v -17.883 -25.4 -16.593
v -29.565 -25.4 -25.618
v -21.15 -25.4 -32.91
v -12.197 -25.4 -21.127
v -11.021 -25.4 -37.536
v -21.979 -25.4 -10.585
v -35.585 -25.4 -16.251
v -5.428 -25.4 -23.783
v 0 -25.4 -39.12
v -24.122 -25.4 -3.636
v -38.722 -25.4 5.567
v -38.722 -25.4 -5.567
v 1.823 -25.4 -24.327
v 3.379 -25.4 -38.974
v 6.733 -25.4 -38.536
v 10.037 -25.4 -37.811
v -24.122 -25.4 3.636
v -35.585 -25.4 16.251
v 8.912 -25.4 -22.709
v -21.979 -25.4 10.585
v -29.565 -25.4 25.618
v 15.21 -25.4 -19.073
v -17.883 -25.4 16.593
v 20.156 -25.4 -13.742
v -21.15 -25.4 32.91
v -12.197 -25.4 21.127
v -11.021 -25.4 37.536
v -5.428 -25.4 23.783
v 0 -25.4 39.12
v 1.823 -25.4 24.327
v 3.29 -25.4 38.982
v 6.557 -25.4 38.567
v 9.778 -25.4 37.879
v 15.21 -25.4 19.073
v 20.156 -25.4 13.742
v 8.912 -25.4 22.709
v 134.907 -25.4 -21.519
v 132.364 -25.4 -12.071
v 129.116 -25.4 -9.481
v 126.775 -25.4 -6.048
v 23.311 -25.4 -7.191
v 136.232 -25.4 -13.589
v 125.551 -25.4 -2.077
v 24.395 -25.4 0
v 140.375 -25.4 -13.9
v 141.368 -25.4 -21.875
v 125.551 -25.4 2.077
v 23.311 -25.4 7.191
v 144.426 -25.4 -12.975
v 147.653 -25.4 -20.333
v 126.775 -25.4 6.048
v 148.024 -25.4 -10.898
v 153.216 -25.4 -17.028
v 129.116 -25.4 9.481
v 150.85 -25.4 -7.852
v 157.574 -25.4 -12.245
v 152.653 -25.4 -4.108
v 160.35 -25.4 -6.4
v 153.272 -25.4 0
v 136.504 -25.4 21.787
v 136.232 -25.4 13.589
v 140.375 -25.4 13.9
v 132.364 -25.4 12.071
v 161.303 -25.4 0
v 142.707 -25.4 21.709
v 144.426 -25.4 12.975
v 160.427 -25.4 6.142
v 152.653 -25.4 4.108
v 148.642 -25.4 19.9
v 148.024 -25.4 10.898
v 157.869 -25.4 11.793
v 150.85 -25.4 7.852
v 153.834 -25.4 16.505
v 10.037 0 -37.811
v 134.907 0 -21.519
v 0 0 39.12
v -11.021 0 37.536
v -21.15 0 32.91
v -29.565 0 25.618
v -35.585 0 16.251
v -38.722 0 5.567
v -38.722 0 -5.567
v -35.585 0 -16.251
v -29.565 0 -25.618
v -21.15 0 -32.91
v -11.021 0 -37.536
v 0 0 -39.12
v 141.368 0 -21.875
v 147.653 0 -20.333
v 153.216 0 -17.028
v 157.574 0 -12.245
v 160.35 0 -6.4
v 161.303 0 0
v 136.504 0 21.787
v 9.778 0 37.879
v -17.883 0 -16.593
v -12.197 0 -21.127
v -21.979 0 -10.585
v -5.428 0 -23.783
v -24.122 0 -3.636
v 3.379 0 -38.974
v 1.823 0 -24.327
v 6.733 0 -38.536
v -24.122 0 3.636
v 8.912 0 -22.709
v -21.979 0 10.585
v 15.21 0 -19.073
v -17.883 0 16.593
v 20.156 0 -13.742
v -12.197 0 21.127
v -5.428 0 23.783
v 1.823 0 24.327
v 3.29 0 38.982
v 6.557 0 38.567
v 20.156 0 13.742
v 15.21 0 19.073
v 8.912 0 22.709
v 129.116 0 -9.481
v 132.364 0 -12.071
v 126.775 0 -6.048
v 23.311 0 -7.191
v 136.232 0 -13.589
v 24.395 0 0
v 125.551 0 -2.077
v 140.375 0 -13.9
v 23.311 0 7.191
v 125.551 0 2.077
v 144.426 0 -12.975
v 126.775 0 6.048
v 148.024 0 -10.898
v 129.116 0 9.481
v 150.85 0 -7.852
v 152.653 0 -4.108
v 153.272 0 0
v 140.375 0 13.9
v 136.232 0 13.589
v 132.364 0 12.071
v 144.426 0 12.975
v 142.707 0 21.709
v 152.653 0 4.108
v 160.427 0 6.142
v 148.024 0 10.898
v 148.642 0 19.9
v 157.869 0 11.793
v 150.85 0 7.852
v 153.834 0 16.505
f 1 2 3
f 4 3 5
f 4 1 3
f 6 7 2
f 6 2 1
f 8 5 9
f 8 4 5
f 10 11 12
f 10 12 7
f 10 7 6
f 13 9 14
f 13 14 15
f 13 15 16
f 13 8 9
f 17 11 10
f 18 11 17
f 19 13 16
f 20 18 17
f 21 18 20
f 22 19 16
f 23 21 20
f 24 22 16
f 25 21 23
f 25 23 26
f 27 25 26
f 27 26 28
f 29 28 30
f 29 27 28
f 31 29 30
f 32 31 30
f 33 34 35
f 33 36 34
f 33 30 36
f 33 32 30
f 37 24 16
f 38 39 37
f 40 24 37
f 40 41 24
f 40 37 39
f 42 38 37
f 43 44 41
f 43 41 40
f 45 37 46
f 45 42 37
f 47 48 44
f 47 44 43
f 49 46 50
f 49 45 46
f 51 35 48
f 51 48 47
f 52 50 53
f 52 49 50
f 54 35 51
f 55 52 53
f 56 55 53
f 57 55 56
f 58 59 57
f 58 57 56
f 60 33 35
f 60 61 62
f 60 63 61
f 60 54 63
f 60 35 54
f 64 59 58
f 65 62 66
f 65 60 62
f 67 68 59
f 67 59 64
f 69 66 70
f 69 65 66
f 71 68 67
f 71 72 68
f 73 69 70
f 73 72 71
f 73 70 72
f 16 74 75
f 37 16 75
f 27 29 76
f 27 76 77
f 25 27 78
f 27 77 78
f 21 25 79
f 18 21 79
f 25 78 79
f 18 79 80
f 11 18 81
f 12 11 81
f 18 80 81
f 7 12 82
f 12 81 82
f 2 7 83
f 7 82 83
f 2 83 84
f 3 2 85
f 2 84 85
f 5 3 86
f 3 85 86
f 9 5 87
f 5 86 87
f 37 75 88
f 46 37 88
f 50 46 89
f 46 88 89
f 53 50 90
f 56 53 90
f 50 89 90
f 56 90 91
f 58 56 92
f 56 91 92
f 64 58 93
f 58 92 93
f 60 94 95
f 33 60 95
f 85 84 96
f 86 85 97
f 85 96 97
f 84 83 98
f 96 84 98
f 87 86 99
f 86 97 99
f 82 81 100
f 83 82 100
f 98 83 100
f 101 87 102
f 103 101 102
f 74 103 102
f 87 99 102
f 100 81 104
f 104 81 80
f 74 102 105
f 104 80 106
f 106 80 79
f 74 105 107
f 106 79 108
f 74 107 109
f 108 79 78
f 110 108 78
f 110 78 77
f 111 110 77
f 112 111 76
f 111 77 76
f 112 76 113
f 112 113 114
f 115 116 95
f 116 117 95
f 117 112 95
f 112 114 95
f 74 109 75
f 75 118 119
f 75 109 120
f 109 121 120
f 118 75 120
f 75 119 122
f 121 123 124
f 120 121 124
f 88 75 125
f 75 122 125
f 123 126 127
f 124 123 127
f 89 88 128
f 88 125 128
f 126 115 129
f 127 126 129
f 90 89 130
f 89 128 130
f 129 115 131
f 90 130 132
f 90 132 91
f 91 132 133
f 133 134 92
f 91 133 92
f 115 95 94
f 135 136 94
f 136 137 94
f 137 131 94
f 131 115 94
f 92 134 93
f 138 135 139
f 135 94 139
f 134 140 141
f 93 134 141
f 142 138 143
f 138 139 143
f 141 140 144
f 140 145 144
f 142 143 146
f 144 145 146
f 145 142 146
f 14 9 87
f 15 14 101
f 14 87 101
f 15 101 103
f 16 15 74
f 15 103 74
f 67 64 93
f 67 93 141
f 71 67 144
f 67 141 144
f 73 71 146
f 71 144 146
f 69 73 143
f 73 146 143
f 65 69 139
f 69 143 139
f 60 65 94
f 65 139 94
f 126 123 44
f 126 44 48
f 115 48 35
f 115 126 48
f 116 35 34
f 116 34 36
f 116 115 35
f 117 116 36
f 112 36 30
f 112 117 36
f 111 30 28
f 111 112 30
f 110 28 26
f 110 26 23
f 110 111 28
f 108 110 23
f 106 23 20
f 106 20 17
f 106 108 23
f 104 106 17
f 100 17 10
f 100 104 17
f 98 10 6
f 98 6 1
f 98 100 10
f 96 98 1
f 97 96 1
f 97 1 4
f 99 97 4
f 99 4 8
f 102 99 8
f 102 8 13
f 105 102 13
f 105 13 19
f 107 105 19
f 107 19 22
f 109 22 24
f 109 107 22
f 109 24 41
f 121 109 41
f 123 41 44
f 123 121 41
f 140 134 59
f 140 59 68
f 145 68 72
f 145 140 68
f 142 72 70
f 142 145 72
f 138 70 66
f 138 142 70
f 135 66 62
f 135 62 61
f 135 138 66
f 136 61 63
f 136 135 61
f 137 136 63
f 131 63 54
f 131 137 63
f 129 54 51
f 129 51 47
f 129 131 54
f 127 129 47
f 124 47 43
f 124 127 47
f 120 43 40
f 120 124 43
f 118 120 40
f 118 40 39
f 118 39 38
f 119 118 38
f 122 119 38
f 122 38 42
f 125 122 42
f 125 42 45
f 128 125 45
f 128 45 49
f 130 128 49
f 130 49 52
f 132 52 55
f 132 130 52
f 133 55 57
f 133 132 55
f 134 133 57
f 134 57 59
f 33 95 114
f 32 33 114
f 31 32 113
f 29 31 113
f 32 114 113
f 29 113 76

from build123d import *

# Parameters (mm, degrees)
F0_R     = 24.394867
F0_R_2   = 13.938556
F1_DEPTH = 25.4


with BuildPart() as f1:
    # F0 (on Front) → F1 (new body)
    with BuildSketch(Plane.XZ):
        with BuildLine():
            Line((9.7775, 37.878718), (0, 39.120286))
            ThreePointArc((0, 39.120286), (-39.120286, 0), (0, -39.120286))
            Line((0, -39.120286), (10.037051, -37.810771))
            ThreePointArc((10.037051, -37.810771), (31.008459, -23.851043), (39.120286, 0))
            ThreePointArc((39.120286, 0), (30.926488, 23.957235), (9.7775, 37.878718))
        make_face()
        Circle(F0_R, mode=Mode.SUBTRACT)
        with BuildLine():
            ThreePointArc((9.7775, 37.878718), (4.928007, 38.808653), (0, 39.120286))
            Line((0, 39.120286), (9.7775, 37.878718))
        make_face()
        with BuildLine():
            Line((10.037051, -37.810771), (0, -39.120286))
            ThreePointArc((0, -39.120286), (5.061058, -38.791526), (10.037051, -37.810771))
        make_face()
        with BuildLine():
            Line((136.504284, 21.786677), (9.7775, 37.878718))
            ThreePointArc((9.7775, 37.878718), (30.926488, 23.957235), (39.120286, 0))
            ThreePointArc((39.120286, 0), (31.008459, -23.851043), (10.037051, -37.810771))
            Line((10.037051, -37.810771), (134.907467, -21.519161))
            ThreePointArc((134.907467, -21.519161), (117.378733, 0.809535), (136.504284, 21.786677))
        make_face()
        with BuildLine():
            ThreePointArc((161.303011, 0), (153.833558, 16.504819), (136.504284, 21.786677))
            ThreePointArc((136.504284, 21.786677), (117.378733, 0.809535), (134.907467, -21.519161))
            ThreePointArc((134.907467, -21.519161), (153.215541, -17.027911), (161.303011, 0))
        make_face()
        with Locations((139.333412, 0)):
            Circle(F0_R_2, mode=Mode.SUBTRACT)
    extrude(amount=F1_DEPTH)


solid = f1.part
